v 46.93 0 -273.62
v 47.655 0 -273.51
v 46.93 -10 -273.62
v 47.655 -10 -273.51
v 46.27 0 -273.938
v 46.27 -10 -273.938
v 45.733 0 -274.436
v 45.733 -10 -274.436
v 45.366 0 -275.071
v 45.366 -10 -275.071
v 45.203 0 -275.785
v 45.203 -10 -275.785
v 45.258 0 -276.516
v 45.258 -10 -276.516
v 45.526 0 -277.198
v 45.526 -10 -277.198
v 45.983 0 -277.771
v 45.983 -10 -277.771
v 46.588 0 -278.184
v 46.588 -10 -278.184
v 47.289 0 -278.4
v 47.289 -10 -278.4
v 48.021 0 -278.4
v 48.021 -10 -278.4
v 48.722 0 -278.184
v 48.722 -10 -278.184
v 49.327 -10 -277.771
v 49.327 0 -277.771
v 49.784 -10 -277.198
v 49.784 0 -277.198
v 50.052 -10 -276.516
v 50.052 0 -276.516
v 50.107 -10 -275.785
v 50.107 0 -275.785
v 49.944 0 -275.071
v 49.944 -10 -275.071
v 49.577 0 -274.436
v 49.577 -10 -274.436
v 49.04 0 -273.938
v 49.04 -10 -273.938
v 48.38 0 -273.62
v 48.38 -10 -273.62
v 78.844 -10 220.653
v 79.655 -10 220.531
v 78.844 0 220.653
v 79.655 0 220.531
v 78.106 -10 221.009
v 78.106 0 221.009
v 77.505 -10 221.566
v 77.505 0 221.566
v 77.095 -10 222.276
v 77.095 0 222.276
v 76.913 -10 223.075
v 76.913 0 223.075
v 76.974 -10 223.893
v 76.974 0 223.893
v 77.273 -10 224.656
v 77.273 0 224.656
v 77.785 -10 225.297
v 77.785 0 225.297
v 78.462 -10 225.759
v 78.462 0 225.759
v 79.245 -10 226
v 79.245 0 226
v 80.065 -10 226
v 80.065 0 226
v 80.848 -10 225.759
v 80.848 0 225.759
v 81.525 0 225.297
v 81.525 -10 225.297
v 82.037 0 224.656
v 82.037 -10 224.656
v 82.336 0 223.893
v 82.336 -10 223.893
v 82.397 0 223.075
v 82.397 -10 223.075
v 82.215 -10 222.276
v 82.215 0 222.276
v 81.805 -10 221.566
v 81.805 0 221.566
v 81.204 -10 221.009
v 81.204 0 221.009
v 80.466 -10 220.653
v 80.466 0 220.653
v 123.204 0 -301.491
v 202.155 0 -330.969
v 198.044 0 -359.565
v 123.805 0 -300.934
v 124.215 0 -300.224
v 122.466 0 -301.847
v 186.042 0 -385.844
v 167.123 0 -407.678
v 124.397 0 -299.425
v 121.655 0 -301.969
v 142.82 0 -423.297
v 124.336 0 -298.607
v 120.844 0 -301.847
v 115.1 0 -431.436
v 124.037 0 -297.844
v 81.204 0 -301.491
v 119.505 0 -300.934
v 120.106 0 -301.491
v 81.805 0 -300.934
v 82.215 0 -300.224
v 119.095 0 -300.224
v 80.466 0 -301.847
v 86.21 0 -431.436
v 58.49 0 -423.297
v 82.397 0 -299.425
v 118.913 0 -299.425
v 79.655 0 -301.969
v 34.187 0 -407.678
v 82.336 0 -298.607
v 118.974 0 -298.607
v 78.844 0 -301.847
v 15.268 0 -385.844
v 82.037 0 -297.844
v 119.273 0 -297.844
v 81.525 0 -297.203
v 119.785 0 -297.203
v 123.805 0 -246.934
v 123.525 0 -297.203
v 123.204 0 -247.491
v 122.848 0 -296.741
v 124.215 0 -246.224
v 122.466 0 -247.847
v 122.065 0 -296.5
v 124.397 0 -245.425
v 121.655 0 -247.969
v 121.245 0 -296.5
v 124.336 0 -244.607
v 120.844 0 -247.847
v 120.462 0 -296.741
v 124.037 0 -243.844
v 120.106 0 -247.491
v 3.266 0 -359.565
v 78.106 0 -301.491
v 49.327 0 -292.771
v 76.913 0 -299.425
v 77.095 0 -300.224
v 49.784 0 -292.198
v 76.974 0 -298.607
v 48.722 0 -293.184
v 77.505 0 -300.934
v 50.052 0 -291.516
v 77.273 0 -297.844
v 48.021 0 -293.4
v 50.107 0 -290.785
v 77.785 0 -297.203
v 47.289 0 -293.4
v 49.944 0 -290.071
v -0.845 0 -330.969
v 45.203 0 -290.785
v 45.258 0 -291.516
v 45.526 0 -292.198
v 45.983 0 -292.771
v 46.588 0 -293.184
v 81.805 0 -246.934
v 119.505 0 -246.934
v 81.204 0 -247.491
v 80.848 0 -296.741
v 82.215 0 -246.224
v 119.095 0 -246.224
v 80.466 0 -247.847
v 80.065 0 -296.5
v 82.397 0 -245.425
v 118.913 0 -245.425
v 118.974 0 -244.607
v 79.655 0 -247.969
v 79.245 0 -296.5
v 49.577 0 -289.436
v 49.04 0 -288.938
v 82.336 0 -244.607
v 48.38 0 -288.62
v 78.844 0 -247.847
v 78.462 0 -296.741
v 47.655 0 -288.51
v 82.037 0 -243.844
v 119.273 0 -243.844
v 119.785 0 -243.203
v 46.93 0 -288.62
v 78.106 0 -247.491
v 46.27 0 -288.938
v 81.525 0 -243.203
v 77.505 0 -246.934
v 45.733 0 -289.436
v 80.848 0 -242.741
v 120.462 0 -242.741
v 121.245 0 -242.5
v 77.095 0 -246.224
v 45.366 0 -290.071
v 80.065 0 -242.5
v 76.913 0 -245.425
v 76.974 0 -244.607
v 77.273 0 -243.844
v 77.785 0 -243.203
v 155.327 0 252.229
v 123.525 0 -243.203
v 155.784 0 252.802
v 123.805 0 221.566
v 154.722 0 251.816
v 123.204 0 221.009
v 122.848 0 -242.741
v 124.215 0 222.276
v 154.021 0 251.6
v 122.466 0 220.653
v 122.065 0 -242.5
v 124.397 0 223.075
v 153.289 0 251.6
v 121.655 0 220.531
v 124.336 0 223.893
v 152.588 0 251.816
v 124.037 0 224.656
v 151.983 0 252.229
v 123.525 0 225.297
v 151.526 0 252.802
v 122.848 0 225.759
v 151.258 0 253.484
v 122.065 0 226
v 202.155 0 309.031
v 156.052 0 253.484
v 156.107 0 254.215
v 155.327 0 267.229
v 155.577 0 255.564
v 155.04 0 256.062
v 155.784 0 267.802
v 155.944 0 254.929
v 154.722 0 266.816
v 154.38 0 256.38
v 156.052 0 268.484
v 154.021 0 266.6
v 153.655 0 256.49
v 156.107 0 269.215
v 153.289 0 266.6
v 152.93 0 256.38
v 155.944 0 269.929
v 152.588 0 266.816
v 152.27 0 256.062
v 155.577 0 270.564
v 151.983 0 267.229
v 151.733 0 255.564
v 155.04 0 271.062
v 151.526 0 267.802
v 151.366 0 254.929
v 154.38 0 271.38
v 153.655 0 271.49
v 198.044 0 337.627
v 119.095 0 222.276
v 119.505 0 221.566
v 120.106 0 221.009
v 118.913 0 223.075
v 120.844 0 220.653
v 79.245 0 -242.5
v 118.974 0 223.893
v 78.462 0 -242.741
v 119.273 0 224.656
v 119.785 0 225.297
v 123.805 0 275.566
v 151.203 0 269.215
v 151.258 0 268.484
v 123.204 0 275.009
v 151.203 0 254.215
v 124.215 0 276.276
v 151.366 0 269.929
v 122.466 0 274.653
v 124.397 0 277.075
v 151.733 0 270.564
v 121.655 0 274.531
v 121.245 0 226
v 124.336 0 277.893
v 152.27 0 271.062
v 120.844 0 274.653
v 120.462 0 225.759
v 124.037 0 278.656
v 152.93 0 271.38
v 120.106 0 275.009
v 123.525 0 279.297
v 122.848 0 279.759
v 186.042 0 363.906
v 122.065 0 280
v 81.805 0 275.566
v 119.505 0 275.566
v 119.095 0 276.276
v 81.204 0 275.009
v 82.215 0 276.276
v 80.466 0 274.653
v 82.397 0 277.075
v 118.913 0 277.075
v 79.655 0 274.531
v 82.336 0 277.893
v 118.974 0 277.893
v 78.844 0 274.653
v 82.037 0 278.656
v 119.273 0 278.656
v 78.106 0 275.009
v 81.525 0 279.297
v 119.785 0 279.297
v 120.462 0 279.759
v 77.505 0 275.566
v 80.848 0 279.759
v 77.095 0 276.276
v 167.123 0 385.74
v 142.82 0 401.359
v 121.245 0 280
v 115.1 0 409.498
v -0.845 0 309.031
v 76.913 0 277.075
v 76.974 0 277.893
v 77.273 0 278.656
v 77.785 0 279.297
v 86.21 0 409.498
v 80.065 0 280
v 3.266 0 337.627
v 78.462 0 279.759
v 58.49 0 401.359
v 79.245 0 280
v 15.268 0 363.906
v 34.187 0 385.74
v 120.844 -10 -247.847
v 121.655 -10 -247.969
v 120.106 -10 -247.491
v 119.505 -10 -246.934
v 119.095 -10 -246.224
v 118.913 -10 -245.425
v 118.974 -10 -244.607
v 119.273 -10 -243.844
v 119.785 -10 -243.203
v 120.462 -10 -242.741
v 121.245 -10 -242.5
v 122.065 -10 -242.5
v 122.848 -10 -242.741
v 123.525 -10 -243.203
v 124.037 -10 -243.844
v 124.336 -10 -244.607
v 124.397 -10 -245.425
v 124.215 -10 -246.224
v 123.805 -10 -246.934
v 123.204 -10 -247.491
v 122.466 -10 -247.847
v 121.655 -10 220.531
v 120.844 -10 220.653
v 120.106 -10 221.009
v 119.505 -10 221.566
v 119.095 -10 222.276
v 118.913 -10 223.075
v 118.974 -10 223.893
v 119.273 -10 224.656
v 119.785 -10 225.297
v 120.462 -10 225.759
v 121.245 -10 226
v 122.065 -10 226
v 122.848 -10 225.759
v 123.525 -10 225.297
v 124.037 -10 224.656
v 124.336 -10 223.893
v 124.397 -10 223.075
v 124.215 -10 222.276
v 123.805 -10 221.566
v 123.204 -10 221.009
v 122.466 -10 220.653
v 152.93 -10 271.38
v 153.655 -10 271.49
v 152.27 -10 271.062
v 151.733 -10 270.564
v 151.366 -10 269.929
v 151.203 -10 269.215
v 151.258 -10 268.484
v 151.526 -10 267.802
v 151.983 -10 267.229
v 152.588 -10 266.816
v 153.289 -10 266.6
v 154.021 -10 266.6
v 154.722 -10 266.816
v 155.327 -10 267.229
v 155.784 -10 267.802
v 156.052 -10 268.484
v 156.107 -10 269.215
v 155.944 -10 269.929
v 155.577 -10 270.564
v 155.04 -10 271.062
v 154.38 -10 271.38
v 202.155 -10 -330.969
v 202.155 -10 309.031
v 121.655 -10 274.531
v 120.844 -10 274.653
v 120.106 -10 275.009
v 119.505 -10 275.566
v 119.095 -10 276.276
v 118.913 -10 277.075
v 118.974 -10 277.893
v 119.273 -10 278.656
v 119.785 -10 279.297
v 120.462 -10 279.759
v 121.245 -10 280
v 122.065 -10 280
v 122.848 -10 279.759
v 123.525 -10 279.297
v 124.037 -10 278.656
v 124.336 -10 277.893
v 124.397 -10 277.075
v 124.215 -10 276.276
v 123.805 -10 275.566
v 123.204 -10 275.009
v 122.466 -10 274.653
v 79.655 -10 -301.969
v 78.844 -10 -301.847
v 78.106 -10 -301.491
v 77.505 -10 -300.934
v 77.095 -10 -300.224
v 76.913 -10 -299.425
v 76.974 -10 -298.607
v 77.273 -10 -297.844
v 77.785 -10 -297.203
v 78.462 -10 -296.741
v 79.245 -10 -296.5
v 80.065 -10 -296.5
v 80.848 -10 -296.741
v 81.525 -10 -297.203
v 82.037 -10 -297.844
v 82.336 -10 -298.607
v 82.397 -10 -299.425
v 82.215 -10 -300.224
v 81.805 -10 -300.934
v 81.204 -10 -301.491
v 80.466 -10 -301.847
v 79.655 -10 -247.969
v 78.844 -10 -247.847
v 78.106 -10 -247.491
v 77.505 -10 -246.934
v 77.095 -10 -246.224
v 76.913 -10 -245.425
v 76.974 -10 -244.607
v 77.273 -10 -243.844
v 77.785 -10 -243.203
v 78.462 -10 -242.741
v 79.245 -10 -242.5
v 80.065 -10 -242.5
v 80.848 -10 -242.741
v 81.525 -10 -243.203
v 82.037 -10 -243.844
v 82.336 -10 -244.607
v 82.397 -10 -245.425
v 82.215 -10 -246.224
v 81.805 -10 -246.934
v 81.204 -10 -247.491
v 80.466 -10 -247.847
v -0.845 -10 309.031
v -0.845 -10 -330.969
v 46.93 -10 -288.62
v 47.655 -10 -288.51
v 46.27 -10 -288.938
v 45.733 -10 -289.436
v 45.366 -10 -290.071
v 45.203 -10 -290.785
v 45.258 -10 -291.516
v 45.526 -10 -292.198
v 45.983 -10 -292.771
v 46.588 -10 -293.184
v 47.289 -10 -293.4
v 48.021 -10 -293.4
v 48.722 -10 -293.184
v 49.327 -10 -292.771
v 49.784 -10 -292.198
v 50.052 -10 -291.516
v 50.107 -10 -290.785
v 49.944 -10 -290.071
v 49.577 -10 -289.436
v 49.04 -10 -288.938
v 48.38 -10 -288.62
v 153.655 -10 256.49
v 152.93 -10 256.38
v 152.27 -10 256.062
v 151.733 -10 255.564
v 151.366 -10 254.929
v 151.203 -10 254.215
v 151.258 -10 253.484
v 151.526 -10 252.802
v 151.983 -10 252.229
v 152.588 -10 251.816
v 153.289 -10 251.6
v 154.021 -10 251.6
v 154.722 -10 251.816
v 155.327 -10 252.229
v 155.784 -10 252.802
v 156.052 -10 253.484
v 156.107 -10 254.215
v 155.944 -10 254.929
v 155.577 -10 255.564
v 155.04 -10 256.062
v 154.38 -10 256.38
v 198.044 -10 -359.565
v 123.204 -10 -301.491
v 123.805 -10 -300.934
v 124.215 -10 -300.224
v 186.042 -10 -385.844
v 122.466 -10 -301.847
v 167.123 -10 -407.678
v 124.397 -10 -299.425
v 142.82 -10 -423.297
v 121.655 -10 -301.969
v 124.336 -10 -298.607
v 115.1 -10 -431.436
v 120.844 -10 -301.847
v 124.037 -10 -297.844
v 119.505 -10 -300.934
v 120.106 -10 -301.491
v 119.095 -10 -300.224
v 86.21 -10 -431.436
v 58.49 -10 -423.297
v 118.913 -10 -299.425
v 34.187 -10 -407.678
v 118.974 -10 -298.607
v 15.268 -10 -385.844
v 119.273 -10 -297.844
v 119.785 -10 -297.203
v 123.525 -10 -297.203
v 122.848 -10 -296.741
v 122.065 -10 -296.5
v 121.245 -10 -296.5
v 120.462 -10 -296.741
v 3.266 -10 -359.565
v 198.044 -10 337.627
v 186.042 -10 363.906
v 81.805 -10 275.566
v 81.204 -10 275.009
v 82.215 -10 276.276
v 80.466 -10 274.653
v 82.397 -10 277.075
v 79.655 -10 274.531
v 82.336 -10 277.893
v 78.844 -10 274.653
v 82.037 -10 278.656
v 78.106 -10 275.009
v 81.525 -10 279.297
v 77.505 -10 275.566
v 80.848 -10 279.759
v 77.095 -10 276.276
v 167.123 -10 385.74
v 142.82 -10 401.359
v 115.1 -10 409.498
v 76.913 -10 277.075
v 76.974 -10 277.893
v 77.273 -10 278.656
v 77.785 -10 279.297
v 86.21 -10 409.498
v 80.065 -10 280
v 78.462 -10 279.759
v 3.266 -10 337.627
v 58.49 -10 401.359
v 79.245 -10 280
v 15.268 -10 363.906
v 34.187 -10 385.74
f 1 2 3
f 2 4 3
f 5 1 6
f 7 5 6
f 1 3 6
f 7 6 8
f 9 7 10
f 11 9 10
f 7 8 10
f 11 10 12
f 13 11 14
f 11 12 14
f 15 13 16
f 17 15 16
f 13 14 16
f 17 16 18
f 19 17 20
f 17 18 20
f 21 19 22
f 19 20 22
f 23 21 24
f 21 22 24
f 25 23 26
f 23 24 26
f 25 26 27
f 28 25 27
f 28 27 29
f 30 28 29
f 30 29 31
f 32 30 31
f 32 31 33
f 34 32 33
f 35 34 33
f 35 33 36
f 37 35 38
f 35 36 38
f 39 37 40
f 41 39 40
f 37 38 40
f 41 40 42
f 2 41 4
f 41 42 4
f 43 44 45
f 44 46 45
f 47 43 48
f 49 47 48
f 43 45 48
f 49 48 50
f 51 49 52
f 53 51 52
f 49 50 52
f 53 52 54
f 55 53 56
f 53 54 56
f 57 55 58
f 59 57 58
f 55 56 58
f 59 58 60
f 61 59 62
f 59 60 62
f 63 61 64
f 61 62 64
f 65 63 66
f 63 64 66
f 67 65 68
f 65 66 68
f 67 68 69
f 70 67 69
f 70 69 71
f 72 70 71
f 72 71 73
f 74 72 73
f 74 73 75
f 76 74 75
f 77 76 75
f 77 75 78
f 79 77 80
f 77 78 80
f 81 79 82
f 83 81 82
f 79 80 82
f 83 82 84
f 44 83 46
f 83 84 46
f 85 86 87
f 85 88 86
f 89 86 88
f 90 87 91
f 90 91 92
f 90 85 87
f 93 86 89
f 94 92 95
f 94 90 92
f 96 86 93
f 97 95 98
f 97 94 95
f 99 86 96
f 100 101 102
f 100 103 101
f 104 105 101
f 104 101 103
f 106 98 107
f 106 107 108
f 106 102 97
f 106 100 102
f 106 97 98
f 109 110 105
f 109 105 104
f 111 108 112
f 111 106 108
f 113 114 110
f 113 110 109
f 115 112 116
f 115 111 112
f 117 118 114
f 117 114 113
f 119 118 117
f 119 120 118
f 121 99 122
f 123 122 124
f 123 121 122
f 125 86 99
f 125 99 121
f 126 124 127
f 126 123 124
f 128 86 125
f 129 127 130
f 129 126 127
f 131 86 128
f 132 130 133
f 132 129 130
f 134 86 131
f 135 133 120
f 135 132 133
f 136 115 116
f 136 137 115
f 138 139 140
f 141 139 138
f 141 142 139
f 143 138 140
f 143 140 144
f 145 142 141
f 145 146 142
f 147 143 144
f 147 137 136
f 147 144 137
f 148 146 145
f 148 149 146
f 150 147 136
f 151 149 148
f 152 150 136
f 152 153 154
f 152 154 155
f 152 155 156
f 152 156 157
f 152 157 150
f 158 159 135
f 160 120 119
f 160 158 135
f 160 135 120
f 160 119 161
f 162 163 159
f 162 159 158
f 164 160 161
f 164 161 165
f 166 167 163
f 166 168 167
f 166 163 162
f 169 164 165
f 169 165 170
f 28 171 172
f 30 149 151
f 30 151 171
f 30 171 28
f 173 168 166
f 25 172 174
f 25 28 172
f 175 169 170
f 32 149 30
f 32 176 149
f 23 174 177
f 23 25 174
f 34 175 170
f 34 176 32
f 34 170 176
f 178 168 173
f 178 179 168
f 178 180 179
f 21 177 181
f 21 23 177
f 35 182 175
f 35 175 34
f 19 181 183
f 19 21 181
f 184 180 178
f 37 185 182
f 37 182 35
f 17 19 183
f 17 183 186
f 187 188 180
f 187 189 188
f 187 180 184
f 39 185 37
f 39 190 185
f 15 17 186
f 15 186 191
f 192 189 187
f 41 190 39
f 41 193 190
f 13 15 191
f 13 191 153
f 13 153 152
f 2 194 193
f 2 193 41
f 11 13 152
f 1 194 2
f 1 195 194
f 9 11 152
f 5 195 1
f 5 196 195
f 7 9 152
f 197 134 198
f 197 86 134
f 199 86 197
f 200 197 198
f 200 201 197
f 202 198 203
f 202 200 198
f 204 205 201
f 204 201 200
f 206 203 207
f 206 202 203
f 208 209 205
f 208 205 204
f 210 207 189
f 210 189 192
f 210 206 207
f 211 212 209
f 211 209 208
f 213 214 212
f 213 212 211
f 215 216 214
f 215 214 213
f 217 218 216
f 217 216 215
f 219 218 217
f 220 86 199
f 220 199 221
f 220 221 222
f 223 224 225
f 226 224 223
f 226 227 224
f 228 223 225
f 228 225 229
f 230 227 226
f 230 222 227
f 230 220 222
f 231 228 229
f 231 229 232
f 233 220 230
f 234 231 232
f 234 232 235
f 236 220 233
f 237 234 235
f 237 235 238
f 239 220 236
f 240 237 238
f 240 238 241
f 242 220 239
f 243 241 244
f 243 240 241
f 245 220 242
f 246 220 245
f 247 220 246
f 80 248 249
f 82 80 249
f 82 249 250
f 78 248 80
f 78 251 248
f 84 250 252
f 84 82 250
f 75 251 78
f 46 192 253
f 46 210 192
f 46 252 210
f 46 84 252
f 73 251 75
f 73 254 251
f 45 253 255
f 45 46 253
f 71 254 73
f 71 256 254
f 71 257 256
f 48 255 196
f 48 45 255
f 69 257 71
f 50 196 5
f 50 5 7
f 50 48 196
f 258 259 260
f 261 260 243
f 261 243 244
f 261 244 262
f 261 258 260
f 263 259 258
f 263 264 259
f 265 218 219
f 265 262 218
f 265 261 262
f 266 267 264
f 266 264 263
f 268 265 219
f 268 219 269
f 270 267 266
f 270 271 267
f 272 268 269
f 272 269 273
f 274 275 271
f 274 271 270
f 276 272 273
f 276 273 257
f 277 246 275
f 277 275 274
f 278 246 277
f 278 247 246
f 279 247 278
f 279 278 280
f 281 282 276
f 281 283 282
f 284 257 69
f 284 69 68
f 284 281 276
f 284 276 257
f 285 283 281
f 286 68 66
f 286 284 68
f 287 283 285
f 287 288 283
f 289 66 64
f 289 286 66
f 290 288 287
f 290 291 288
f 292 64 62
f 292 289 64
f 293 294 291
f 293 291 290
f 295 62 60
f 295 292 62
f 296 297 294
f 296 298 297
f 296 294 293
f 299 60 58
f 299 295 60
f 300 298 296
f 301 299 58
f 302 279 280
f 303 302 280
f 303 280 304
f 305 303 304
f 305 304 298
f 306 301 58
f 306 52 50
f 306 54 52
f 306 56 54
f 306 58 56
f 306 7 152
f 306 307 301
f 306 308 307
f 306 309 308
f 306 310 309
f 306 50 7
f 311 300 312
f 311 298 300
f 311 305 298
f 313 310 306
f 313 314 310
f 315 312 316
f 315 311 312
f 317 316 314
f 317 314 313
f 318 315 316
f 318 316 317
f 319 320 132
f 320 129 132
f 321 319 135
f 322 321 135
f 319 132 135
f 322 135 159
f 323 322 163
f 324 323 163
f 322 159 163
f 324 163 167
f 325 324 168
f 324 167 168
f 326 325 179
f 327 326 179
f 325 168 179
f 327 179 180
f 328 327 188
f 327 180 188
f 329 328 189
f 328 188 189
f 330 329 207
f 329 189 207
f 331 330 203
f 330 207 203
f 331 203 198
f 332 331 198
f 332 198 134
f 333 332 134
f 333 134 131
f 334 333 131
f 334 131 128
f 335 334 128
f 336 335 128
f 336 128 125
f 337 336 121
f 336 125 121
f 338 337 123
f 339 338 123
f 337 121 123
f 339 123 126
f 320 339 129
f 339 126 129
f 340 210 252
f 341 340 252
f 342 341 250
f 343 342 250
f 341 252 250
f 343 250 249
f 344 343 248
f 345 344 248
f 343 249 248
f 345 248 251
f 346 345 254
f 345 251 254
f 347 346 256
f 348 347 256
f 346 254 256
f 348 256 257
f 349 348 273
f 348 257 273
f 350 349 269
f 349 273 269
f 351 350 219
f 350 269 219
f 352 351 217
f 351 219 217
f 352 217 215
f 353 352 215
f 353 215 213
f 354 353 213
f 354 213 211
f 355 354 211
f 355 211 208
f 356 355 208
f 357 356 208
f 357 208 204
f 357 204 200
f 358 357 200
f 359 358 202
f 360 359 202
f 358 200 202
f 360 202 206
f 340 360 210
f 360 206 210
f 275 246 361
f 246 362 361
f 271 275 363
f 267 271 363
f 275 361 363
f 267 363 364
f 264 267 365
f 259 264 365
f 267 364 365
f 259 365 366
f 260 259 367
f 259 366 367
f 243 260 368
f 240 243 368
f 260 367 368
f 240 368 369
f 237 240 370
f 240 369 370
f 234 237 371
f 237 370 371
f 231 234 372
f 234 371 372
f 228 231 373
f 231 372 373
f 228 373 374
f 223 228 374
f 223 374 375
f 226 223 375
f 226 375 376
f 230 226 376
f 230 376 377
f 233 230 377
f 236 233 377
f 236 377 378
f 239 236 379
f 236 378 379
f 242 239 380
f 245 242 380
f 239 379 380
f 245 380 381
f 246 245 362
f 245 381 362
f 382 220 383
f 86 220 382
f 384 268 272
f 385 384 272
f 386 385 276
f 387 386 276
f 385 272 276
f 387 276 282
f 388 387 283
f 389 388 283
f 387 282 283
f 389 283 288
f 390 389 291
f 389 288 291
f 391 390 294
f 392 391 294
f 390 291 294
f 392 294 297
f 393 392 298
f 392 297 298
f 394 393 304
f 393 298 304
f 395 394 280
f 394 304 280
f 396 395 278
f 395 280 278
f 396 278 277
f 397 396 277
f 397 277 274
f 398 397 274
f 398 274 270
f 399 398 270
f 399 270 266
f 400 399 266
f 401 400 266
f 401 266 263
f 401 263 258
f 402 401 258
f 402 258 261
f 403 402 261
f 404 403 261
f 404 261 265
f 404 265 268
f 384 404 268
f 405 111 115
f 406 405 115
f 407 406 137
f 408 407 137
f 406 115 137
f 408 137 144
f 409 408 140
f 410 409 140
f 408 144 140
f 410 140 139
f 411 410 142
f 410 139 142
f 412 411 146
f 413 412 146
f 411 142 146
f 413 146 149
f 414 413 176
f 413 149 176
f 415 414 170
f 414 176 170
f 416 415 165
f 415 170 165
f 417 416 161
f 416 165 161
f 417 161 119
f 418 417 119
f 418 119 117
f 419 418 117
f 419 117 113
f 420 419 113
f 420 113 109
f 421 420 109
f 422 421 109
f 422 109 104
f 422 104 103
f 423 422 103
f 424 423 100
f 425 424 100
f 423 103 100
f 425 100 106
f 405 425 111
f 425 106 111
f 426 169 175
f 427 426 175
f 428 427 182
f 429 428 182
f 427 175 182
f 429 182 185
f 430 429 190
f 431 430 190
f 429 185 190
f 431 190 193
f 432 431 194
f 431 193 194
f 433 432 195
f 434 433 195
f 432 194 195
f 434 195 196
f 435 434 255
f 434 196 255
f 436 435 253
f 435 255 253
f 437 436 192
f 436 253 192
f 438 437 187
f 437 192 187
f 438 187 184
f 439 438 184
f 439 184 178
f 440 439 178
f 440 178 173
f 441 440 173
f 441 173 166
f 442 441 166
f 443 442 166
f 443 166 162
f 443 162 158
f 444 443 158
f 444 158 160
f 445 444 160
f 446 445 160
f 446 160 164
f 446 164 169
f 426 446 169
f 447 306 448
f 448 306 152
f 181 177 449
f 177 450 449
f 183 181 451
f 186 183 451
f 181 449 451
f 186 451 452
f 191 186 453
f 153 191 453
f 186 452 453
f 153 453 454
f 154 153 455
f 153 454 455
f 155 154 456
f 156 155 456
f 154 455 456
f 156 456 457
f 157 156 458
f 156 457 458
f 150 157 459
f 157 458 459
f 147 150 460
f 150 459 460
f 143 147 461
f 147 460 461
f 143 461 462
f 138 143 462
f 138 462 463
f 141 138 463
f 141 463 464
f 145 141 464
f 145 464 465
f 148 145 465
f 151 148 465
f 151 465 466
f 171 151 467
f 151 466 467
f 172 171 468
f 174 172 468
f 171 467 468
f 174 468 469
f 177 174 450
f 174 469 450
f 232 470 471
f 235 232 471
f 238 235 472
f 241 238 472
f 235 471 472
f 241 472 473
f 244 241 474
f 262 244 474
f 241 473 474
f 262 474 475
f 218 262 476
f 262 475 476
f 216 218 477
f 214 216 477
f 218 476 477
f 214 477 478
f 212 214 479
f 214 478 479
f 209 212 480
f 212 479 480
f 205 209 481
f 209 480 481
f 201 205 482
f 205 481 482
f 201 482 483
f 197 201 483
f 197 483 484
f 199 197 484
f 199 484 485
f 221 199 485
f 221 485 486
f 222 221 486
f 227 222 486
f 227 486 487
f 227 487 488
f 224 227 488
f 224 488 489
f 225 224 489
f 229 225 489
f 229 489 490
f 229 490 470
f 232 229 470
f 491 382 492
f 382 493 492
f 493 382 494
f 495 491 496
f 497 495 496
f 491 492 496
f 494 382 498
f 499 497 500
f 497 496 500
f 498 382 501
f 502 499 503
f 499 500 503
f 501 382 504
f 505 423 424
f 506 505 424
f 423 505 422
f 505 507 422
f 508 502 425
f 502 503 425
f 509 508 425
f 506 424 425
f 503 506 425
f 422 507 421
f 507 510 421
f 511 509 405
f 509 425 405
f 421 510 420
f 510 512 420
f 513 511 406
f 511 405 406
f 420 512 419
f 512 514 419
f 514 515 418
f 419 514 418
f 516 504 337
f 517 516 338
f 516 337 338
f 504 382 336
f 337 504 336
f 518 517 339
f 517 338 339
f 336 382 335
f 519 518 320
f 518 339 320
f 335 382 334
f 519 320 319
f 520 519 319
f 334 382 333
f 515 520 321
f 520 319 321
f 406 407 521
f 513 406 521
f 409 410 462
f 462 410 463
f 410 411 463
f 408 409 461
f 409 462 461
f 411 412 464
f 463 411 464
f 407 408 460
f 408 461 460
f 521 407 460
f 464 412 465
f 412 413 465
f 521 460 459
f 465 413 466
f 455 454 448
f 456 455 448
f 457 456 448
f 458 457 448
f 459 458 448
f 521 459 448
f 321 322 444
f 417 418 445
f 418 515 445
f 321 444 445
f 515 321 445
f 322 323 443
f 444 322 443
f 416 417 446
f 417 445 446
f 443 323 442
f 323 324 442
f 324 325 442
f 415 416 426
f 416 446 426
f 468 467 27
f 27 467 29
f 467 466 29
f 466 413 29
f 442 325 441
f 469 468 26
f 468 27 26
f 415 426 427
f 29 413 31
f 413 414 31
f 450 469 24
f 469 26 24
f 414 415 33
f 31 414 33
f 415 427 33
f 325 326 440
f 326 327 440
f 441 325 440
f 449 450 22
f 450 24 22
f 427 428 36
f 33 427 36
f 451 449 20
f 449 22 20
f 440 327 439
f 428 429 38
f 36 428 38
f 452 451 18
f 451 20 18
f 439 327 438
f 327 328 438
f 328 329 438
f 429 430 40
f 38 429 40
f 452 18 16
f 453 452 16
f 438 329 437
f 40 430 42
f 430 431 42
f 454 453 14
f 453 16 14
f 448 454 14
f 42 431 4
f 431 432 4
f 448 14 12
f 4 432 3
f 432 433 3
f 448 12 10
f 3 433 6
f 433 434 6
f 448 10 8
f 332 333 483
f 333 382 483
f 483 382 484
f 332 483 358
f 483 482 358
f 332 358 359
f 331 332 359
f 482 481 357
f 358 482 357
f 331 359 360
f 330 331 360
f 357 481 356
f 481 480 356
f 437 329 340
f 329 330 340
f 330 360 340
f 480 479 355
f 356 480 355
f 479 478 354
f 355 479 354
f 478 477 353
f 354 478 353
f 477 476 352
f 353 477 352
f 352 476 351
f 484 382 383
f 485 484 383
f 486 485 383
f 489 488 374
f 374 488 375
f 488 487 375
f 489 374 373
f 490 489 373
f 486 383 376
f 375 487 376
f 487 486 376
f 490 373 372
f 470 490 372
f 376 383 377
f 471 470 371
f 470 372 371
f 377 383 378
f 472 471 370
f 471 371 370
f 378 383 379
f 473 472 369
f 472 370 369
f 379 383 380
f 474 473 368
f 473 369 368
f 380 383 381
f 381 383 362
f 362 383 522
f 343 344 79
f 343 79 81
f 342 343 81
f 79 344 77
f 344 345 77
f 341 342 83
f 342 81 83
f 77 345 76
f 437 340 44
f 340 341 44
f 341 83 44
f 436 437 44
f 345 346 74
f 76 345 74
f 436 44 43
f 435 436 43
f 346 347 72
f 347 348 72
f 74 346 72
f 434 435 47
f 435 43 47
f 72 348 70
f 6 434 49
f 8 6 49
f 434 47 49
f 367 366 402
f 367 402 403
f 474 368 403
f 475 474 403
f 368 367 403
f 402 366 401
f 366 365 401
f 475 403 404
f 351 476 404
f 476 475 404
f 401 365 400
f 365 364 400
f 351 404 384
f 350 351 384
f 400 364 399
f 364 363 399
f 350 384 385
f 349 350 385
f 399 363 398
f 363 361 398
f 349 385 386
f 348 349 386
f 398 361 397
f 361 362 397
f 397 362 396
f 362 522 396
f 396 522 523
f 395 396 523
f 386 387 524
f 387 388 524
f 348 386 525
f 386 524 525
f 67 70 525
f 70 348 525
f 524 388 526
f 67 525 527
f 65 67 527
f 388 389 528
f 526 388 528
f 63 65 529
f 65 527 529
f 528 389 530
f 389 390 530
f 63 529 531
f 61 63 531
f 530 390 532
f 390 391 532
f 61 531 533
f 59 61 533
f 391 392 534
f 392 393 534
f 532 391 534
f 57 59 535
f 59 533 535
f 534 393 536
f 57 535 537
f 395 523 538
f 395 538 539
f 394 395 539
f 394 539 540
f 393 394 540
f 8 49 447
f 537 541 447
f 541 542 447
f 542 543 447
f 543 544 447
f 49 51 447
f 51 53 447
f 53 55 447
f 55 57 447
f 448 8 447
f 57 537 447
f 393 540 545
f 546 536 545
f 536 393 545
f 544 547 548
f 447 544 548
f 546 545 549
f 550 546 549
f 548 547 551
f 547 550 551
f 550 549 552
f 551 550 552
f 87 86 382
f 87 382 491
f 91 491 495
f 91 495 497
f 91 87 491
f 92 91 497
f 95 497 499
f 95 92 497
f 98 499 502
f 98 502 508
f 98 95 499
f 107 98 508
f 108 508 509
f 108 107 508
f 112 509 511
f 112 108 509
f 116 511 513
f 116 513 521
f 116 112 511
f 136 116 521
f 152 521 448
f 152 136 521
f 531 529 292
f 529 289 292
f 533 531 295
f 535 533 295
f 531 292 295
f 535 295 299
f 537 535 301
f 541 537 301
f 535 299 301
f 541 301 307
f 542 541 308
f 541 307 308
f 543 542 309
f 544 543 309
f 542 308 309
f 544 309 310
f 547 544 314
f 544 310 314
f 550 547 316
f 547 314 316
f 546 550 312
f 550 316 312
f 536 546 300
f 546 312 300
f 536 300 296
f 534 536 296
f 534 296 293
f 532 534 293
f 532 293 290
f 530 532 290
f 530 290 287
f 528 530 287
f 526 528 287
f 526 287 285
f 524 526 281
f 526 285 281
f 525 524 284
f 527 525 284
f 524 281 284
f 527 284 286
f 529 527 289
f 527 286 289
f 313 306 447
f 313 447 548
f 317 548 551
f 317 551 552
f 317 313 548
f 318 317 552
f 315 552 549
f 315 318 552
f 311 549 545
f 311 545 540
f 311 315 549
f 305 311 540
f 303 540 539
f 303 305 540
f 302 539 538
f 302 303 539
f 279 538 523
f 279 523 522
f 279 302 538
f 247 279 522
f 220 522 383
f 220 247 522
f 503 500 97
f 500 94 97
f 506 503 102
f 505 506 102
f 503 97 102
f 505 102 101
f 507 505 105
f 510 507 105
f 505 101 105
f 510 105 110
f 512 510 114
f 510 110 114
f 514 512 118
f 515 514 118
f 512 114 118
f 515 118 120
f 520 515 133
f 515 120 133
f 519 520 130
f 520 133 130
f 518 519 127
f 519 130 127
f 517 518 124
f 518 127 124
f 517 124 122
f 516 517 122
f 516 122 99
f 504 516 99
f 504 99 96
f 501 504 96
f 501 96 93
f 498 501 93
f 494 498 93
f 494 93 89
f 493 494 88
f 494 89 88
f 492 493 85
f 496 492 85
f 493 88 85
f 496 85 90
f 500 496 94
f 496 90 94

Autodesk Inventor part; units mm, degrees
ref_plane "YZ Plane" through (0, 0, 0) normal (1, 0, 0) x (0, 1, 0)
ref_plane "XZ Plane" through (0, 0, 0) normal (0, 1, 0) x (-1, 0, 0)
ref_plane "XY Plane" through (0, 0, 0) normal (0, 0, 1) x (1, 0, 0)
sketch "スケッチ1" plane through (0, 0, 0) normal (0, 1, 0) x (-1, 0, 0)
  point P0 (0, 0)
sketch "スケッチ2" plane through (0, 0, 0) normal (0, 1, 0) x (-1, 0, 0)
  line L0 (0.845, -60.969) -> (0.845, -330.969)
  line L1 (0, 0) -> (0, -1.5537)
  line L2 (-202.155, -60.969) -> (-202.155, -330.969)
  arc A0 (-202.155, -330.969) -> (0.845, -330.969) centre (-100.655, -330.969) ccw
  line L3 (0.845, -60.969) -> (0.845, 309.031)
  line L4 (-202.155, -60.969) -> (-202.155, 309.031)
  arc A1 (0.845, 309.031) -> (-202.155, 309.031) centre (-100.655, 309.031) ccw
  dimension "d0" = 270
  dimension "d1" = 203
extrude "押し出し1" add sketch "スケッチ2" against normal blind 10
sketch "スケッチ4" plane through (0, -10, 0) normal (0, -1, 0) x (1, 0, 0)
  line L0 (73.655, -234.969) -> (127.655, -234.969)
  line L1 (127.655, -234.969) -> (127.655, -310.969)
  line L2 (127.655, -310.969) -> (73.655, -310.969)
  line L3 (73.655, -310.969) -> (73.655, -234.969)
  line L4 (202.155, -330.969) -> (202.155, 309.031) projected
  line L5 (-0.845, 309.031) -> (-0.845, -330.969) projected
  arc A0 (-0.845, -330.969) -> (202.155, -330.969) centre (100.655, -330.969) ccw projected
  line L6 (-0.845, -10.969) -> (202.155, -10.969)
  arc A1 (202.155, 309.031) -> (-0.845, 309.031) centre (100.655, 309.031) ccw projected
  line L7 (73.655, 213.031) -> (127.655, 213.031)
  line L8 (127.655, 213.031) -> (127.655, 289.031)
  line L9 (127.655, 289.031) -> (73.655, 289.031)
  line L10 (73.655, 289.031) -> (73.655, 213.031)
  circle A2 centre (79.655, -299.219) radius 2.75
  line L11 (100.655, -256.1001) -> (100.655, -272.969)
  circle A3 centre (79.655, -245.219) radius 2.75
  circle A4 centre (121.655, -299.219) radius 2.75
  circle A5 centre (121.655, -245.219) radius 2.75
  line L12 (73.655, 213.031) -> (127.655, 213.031)
  line L13 (127.655, 213.031) -> (127.655, 289.031)
  line L14 (127.655, 289.031) -> (73.655, 289.031)
  line L15 (73.655, 289.031) -> (73.655, 213.031)
  circle A6 centre (79.655, 277.281) radius 2.75
  line L16 (100.655, 234.1622) -> (100.655, 251.031)
  circle A7 centre (79.655, 223.281) radius 2.75
  circle A8 centre (121.655, 223.281) radius 2.75
  circle A9 centre (121.655, 277.281) radius 2.75
  point P0 (0, 0)
  dimension "d4" = 74.5
  dimension "d5" = 74.5
  dimension "d6" = 54
  dimension "d7" = 76
  dimension "d8" = 20
  dimension "d9" = 320
  dimension "d17" = 5.5
  dimension "d18" = 11.75
  dimension "d19" = 6
  dimension "d20" = 27
  dimension "d21" = 5.5
  dimension "d22" = 10.25
  dimension "d23" = 6
hole "穴2" at (79.655, -10, -245.219) at (79.655, -10, -299.219) at (121.655, -10, -299.219) at (121.655, -10, -245.219) direction (0, 1, 0) diameter 5.5 end through all
hole "穴3" at (79.655, -10, 223.281) at (121.655, -10, 223.281) at (121.655, -10, 277.281) at (79.655, -10, 277.281) direction (0, 1, 0) diameter 5.5 end through all
sketch "スケッチ6" plane through (0, 0, 0) normal (0, 1, 0) x (1, 0, 0)
  circle A0 centre (153.655, -269.031) radius 6
  circle A1 centre (153.655, -254.031) radius 6
  line L0 (202.155, 330.969) -> (202.155, -309.031) projected
  arc A2 (-0.845, -309.031) -> (202.155, -309.031) centre (100.655, -309.031) ccw projected
  point P0 (0, 0)
  dimension "d40" = 12
  dimension "d41" = 12
  dimension "d42" = 15
  dimension "d43" = 48.5
  dimension "d44" = 48.5
  dimension "d45" = 40
hole "穴4" at (153.655, 0, 254.031) at (153.655, 0, 269.031) direction (0, -1, 0) diameter 4.917 end through all thread size "M6x1" class "6H" standard "ANSI Metric M Profile"
sketch "スケッチ7" plane through (0, 0, 0) normal (0, 1, 0) x (1, 0, 0)
  circle A0 centre (47.655, 290.969) radius 6
  circle A1 centre (47.655, 275.969) radius 6
  arc A2 (202.155, 330.969) -> (-0.845, 330.969) centre (100.655, 330.969) ccw projected
  line L0 (-0.845, -309.031) -> (-0.845, 330.969) projected
  point P0 (0, 0)
  dimension "d53" = 12
  dimension "d54" = 12
  dimension "d55" = 15
  dimension "d56" = 40
  dimension "d57" = 48.5
  dimension "d58" = 48.5
hole "穴5" at (47.655, 0, -290.969) at (47.655, 0, -275.969) direction (0, -1, 0) diameter 4.917 end through all thread size "M6x1" class "6H" standard "ANSI Metric M Profile"
properties part number "sfp_smartboard_lower_deck" material "合板、仕上げ"
